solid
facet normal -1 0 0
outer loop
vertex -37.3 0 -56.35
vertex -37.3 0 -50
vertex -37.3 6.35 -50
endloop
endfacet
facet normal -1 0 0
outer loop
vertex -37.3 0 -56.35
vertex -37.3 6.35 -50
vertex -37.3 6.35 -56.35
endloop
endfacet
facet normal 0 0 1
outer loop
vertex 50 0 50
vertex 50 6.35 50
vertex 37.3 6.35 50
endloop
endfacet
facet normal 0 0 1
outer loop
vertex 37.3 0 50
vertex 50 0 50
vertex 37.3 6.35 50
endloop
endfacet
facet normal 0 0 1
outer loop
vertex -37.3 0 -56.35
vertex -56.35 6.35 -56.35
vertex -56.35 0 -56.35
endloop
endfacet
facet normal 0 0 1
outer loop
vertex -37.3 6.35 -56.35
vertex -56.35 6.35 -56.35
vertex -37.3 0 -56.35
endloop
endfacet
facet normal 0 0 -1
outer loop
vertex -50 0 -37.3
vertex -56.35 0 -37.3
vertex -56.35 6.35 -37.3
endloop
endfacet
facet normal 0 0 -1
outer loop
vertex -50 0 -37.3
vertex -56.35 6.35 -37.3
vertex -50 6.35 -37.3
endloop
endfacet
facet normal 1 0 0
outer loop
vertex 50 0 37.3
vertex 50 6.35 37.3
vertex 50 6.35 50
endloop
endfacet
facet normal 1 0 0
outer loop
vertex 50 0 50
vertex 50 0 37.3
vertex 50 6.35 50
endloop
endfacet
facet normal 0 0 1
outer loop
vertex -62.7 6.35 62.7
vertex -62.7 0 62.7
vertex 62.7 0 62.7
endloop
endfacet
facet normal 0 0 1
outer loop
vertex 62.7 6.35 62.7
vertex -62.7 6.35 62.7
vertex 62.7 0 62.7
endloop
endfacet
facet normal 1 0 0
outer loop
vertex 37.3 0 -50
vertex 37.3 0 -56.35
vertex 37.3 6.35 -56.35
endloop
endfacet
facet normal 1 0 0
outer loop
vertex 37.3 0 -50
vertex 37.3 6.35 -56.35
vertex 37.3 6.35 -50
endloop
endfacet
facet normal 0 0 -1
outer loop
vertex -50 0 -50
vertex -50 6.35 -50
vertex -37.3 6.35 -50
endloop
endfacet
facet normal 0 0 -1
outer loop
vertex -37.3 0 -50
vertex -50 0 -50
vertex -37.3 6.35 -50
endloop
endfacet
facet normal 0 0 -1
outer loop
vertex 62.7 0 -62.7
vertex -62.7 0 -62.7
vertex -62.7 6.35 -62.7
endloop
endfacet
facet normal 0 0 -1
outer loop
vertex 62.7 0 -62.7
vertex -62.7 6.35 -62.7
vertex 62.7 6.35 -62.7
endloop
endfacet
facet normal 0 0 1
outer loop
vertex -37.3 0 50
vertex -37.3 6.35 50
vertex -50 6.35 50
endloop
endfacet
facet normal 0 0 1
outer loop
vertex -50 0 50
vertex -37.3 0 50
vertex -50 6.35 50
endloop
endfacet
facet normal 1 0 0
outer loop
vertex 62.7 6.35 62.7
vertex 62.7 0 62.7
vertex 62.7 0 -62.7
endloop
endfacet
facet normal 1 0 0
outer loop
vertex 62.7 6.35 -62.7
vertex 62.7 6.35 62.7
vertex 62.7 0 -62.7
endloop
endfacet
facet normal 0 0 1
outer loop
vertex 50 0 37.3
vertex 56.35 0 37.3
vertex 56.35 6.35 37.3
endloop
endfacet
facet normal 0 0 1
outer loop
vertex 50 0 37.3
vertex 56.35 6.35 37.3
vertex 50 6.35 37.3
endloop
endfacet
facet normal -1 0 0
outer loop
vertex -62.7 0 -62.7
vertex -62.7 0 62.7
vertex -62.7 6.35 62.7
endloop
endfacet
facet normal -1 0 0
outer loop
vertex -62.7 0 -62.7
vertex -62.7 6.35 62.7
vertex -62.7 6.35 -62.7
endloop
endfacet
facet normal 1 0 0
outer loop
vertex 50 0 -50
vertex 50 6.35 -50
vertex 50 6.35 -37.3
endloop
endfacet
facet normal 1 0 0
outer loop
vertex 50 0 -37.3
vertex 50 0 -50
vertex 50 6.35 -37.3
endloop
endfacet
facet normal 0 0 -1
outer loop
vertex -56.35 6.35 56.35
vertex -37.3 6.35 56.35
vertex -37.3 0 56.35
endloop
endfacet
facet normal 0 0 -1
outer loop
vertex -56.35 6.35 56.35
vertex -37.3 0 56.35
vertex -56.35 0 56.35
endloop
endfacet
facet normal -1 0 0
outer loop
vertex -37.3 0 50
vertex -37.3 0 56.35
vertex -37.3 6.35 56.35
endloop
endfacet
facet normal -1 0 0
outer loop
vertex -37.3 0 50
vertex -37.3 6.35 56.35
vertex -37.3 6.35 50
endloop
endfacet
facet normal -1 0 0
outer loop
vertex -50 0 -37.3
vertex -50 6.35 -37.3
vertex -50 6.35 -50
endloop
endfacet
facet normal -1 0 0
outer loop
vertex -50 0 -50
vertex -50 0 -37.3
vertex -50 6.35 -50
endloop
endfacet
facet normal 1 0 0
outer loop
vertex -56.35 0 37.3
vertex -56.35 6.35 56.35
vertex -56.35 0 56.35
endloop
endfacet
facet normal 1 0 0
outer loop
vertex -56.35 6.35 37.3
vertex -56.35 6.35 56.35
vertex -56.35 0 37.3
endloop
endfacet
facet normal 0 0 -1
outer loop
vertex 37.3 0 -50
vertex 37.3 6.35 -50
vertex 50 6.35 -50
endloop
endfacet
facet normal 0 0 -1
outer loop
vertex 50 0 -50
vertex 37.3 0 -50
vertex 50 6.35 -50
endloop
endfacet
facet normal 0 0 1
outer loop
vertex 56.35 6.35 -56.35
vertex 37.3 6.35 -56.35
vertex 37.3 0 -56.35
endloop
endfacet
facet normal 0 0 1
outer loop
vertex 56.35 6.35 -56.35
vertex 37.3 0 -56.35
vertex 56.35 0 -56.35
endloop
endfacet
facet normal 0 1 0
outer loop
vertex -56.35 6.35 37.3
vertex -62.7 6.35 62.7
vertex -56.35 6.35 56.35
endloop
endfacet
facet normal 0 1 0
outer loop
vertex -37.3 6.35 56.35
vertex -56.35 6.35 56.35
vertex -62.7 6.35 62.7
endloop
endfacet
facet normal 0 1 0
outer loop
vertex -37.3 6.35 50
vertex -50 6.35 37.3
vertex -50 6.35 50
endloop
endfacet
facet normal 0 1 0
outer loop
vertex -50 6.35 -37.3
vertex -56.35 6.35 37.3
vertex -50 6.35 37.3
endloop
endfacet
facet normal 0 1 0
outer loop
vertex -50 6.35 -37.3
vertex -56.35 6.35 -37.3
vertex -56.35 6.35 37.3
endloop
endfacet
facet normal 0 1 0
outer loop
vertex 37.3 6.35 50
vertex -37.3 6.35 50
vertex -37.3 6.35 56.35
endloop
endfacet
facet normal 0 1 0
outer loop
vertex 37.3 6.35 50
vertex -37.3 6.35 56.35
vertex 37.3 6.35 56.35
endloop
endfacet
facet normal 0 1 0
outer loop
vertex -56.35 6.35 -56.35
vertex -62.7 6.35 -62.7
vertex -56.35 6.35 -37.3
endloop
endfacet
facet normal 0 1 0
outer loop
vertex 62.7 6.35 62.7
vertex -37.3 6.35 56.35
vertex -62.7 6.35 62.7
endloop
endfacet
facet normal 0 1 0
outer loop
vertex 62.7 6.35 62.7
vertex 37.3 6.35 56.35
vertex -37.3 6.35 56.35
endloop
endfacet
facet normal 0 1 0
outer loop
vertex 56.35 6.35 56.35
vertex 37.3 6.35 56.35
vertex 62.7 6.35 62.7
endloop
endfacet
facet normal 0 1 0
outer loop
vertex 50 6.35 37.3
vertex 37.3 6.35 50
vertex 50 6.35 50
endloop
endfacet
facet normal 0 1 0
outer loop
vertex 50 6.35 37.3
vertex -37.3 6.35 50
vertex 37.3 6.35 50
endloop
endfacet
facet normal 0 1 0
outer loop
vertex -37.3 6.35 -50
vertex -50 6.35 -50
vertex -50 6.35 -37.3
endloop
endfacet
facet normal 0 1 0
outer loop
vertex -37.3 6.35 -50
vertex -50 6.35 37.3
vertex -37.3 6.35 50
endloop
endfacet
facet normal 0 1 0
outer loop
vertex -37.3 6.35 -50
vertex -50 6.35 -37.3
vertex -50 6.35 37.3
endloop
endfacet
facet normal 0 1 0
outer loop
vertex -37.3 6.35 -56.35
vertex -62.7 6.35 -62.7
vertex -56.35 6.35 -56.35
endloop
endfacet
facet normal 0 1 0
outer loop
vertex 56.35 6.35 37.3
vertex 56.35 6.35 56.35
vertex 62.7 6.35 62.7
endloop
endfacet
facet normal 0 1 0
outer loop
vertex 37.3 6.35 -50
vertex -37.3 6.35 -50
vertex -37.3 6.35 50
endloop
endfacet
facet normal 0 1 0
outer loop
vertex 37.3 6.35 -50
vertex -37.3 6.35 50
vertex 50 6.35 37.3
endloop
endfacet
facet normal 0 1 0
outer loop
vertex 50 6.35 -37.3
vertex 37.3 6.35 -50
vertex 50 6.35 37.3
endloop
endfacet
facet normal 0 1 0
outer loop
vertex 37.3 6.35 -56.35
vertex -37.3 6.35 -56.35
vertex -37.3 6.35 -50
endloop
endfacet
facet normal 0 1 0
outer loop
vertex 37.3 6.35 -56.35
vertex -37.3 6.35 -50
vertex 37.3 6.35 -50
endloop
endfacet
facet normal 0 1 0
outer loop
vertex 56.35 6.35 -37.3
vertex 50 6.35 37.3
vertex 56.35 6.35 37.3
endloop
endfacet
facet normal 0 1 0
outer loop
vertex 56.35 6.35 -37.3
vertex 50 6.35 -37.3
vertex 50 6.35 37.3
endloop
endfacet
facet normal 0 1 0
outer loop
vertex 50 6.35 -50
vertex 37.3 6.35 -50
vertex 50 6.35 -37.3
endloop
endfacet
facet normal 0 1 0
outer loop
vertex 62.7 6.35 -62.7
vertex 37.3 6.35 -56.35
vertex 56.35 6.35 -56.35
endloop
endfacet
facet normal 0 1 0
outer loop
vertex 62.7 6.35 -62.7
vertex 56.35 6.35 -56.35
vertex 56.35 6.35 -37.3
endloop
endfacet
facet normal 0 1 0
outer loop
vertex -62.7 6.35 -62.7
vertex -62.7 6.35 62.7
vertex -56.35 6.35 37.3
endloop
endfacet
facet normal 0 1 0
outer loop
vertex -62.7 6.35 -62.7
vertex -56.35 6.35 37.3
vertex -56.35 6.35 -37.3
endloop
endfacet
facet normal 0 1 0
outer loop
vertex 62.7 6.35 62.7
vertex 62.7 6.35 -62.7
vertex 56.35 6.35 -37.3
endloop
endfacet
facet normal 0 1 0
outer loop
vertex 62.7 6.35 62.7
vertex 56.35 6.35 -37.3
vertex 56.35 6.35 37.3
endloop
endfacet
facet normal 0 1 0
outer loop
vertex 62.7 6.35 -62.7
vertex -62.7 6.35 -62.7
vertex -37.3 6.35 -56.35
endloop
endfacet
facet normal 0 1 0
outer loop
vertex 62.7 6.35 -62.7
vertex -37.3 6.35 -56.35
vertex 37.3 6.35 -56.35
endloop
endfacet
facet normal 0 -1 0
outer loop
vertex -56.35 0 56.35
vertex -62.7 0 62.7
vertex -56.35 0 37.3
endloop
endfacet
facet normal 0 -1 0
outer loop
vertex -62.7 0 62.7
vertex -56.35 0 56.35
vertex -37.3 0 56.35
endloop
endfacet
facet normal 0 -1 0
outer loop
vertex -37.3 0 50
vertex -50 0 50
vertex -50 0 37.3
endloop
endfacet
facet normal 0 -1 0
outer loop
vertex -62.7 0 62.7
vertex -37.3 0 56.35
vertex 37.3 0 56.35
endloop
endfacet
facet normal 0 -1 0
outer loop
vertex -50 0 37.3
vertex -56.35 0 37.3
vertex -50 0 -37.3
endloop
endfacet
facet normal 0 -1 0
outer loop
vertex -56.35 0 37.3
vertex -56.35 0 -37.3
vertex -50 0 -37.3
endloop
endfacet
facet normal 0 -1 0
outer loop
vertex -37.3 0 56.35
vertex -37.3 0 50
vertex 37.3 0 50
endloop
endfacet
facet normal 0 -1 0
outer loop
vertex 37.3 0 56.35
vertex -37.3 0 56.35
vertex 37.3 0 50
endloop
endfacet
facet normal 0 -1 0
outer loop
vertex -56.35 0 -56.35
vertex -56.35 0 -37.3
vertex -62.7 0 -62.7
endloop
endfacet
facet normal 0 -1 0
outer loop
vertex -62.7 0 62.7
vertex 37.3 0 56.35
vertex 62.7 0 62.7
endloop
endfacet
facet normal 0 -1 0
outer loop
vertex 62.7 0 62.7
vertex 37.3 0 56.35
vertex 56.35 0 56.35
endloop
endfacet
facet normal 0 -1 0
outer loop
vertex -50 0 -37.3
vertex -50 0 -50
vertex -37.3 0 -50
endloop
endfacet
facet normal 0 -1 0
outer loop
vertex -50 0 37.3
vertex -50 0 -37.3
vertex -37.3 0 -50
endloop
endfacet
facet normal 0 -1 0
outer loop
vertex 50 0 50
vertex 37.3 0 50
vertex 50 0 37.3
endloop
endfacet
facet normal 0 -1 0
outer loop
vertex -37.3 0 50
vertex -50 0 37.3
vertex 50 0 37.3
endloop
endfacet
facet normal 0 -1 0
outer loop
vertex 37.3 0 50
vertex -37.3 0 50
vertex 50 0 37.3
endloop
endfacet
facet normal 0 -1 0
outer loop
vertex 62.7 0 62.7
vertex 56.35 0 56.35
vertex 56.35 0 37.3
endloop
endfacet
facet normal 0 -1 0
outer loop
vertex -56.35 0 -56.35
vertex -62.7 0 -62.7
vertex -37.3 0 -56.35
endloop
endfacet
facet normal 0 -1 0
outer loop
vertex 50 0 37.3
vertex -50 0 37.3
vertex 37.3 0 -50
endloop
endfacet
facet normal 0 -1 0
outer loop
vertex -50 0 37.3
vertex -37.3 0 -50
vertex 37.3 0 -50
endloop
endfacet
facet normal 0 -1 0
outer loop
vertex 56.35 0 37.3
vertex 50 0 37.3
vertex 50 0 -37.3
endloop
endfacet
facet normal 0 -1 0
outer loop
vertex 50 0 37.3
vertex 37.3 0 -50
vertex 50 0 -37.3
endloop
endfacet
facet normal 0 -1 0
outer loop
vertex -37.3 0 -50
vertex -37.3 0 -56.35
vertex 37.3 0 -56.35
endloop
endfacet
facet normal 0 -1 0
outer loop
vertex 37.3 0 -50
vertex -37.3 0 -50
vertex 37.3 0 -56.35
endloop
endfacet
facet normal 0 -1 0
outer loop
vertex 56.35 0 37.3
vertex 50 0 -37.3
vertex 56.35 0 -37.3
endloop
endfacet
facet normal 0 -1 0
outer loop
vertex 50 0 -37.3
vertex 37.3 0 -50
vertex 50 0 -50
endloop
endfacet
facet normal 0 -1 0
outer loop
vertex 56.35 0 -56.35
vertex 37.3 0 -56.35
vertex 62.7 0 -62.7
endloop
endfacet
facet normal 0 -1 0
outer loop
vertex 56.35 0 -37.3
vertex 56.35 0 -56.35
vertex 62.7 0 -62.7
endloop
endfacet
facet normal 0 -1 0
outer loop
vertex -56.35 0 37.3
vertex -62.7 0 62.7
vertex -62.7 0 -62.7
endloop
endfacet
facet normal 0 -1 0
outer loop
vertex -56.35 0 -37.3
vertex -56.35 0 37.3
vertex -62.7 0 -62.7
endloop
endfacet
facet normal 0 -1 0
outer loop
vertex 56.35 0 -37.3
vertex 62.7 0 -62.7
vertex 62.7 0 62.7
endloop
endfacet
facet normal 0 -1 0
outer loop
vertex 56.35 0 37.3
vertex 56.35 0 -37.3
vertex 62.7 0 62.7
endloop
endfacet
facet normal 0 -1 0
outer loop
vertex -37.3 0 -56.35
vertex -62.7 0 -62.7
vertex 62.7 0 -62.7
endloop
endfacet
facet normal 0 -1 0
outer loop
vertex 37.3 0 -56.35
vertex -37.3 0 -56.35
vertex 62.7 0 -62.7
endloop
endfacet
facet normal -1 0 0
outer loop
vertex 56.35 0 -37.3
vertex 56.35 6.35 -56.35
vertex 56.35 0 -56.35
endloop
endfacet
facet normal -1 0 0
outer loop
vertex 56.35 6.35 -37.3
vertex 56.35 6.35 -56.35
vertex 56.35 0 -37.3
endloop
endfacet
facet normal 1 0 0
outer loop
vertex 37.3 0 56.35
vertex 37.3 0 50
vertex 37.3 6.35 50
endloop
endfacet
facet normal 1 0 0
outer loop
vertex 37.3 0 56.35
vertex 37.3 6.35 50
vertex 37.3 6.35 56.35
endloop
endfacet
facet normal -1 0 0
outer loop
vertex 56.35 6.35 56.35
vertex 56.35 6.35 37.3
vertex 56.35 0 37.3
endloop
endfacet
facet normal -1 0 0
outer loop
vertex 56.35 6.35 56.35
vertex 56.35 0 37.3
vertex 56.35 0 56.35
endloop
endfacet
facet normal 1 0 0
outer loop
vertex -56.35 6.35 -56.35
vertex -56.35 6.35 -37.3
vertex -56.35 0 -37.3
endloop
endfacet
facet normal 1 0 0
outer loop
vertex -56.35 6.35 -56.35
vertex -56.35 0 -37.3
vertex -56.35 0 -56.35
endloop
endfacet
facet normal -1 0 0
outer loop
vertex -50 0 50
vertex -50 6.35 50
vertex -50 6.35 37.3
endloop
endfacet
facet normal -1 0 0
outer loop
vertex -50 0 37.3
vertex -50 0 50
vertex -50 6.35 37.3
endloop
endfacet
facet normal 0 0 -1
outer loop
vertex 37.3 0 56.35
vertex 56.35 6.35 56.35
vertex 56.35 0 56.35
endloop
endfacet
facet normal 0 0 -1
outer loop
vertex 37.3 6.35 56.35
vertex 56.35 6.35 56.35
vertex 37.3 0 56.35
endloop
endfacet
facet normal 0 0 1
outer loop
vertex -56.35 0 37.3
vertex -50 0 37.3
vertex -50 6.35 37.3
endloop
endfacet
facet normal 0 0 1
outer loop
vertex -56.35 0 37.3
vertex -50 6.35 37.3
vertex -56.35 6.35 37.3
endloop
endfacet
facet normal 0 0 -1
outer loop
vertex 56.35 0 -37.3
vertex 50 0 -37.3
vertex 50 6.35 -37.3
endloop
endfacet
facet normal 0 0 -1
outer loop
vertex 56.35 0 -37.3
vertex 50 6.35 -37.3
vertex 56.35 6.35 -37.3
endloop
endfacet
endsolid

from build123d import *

# Parameters (mm, degrees)
SKETCH1_W           = 125.4
SKETCH1_H           = 125.4
BOSS_EXTRUDE1_DEPTH = 6.35
SKETCH4_W           = 6.35
SKETCH4_H           = 12.7
CUT_EXTRUDE1_DEPTH  = 89.898270512
SKETCH5_W           = 19.05
SKETCH5_H           = 6.35
CUT_EXTRUDE2_DEPTH  = 89.898270512
CIRPATTERN1_COUNT   = 4
CIRPATTERN2_COUNT   = 4


with BuildPart() as part:
    # Sketch1 → Boss-Extrude1 (new body)
    with BuildSketch(Plane(origin=(0, 0, 0), x_dir=(1, 0, 0), z_dir=(0, 1, 0))):
        Rectangle(SKETCH1_W, SKETCH1_H)
    extrude(amount=BOSS_EXTRUDE1_DEPTH)

    # Sketch4 → Cut-Extrude1 (cut, through all)
    with BuildSketch(Plane(origin=(0, 6.35, 0), x_dir=(1, 0, 0), z_dir=(0, 1, 0))):
        with Locations((-53.175, 43.65)):
            Rectangle(SKETCH4_W, SKETCH4_H)
    cut_extrude1 = extrude(amount=-CUT_EXTRUDE1_DEPTH, mode=Mode.SUBTRACT)

    # Sketch5 → Cut-Extrude2 (cut, through all)
    with BuildSketch(Plane(origin=(0, 6.35, 0), x_dir=(1, 0, 0), z_dir=(0, 1, 0))):
        with Locations((-46.825, 53.175)):
            Rectangle(SKETCH5_W, SKETCH5_H)
    cut_extrude2 = extrude(amount=-CUT_EXTRUDE2_DEPTH, mode=Mode.SUBTRACT)

    # CirPattern1: Cut-Extrude1 ×4 about axis
    cirpattern1_axis = Axis((0, 6.35, 0), (0, 1, 0))
    for i in range(1, CIRPATTERN1_COUNT):
        add(cut_extrude1.rotate(cirpattern1_axis, i * 360 / CIRPATTERN1_COUNT), mode=Mode.SUBTRACT)

    # CirPattern2: Cut-Extrude2 ×4 about axis
    cirpattern2_axis = Axis((0, 6.35, 0), (0, 1, 0))
    for i in range(1, CIRPATTERN2_COUNT):
        add(cut_extrude2.rotate(cirpattern2_axis, i * 360 / CIRPATTERN2_COUNT), mode=Mode.SUBTRACT)


solid = part.part
